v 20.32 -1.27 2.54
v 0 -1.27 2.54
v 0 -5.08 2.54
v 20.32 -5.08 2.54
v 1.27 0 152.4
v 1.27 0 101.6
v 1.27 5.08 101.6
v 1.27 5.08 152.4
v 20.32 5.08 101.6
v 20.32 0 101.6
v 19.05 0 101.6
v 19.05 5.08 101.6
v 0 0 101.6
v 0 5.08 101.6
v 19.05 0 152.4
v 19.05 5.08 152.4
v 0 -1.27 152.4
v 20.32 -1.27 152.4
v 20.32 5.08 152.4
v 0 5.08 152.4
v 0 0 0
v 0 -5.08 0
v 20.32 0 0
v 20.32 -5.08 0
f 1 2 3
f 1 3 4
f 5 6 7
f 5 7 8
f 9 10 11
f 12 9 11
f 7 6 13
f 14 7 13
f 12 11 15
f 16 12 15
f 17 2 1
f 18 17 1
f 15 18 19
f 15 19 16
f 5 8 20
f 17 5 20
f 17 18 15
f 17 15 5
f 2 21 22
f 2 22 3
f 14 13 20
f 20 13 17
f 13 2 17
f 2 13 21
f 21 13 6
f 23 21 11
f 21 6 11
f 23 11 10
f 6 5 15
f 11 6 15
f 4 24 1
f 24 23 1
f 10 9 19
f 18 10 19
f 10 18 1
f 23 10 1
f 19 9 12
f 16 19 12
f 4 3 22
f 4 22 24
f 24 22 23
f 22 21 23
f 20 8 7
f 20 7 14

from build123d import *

# Parameters (mm, degrees)
F0_W     = 20.32
F0_H     = 152.4
F1_DEPTH = 1.27
F2_W     = 20.32
F2_H     = 2.54
F3_DEPTH = 3.81
F4_W     = 1.27
F4_H     = 50.8
F5_DEPTH = 5.08


with BuildPart() as f1:
    # F0 (on Front) → F1 (new body)
    with BuildSketch(Plane.XZ):
        with Locations((10.16, 76.2)):
            Rectangle(F0_W, F0_H)
    extrude(amount=F1_DEPTH)

    # F2 (on face) → F3 (join)
    with BuildSketch(Plane.XZ.offset(1.27)):
        with Locations((10.16, 1.27)):
            Rectangle(F2_W, F2_H)
    extrude(amount=F3_DEPTH)

    # F4 (on face) → F5 (join)
    with BuildSketch(Plane(origin=(0, 0, 0), x_dir=(-1, 0, 0), z_dir=(0, 1, 0))):
        with Locations((-0.635, 127)):
            Rectangle(F4_W, F4_H)
        with Locations((-19.685, 127)):
            Rectangle(F4_W, F4_H)
    extrude(amount=F5_DEPTH)


solid = f1.part
